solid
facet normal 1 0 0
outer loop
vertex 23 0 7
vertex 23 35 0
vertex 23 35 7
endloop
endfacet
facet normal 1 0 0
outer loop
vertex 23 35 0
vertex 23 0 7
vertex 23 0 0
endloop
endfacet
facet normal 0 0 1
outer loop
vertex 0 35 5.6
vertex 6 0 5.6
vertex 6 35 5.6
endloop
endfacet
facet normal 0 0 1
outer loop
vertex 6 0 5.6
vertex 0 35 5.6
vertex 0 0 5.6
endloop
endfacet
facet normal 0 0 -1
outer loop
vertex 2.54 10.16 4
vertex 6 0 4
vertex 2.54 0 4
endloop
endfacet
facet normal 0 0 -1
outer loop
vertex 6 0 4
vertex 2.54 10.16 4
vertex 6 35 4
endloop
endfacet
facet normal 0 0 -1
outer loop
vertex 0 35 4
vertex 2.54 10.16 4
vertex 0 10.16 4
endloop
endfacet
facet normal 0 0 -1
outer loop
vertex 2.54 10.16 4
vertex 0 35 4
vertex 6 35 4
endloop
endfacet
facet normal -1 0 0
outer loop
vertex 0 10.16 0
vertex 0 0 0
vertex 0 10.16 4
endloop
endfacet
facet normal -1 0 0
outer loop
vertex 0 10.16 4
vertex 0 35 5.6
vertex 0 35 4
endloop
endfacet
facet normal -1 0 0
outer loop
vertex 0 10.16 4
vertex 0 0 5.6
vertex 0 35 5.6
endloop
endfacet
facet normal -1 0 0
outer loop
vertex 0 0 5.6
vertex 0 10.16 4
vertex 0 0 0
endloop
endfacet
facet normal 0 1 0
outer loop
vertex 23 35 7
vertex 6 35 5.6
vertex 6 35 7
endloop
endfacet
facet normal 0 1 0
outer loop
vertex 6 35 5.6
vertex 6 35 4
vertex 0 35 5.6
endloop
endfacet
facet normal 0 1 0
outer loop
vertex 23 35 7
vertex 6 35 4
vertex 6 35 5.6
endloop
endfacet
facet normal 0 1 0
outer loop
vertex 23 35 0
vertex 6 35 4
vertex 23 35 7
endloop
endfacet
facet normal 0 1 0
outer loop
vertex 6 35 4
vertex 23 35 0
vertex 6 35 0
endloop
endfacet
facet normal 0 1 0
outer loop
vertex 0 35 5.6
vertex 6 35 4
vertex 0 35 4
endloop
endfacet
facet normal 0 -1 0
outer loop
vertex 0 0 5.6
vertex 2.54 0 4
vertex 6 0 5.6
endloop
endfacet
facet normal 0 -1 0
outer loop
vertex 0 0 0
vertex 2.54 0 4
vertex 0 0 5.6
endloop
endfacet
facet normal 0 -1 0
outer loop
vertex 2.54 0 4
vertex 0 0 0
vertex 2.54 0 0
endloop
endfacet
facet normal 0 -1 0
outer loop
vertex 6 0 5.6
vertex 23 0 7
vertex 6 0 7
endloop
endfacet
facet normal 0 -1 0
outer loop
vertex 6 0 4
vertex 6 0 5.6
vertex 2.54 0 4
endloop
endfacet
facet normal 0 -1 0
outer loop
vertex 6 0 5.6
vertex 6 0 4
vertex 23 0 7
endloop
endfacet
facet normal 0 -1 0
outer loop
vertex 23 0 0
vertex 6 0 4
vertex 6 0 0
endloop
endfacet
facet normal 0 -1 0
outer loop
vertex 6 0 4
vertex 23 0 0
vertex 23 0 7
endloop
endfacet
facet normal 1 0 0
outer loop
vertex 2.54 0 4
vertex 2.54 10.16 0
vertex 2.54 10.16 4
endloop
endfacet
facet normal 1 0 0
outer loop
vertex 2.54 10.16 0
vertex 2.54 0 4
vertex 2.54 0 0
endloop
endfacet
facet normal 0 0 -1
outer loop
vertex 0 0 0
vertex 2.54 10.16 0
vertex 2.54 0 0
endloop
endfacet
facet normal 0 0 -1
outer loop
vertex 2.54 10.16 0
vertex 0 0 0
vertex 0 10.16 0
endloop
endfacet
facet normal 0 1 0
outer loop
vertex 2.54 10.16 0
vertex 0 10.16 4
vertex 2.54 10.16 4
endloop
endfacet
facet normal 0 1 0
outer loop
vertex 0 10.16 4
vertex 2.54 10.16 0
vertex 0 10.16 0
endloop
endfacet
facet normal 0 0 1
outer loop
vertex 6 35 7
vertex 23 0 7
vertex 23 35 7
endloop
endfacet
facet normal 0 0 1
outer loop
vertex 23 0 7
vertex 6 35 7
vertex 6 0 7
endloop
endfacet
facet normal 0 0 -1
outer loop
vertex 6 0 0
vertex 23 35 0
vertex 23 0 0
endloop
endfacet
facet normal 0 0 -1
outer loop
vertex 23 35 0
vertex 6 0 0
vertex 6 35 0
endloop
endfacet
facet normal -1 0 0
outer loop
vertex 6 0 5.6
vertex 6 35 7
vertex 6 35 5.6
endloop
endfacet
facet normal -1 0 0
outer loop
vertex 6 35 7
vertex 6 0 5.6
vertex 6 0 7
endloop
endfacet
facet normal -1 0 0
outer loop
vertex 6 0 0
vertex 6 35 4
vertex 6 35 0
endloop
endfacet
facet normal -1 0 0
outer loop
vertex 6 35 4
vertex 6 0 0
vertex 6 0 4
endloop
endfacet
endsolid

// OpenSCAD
translate([0,0,4])cube([23,35,1.6]);
cube([2.54,10.16,5]);
translate([6,0,0])cube([17,35,7]);
